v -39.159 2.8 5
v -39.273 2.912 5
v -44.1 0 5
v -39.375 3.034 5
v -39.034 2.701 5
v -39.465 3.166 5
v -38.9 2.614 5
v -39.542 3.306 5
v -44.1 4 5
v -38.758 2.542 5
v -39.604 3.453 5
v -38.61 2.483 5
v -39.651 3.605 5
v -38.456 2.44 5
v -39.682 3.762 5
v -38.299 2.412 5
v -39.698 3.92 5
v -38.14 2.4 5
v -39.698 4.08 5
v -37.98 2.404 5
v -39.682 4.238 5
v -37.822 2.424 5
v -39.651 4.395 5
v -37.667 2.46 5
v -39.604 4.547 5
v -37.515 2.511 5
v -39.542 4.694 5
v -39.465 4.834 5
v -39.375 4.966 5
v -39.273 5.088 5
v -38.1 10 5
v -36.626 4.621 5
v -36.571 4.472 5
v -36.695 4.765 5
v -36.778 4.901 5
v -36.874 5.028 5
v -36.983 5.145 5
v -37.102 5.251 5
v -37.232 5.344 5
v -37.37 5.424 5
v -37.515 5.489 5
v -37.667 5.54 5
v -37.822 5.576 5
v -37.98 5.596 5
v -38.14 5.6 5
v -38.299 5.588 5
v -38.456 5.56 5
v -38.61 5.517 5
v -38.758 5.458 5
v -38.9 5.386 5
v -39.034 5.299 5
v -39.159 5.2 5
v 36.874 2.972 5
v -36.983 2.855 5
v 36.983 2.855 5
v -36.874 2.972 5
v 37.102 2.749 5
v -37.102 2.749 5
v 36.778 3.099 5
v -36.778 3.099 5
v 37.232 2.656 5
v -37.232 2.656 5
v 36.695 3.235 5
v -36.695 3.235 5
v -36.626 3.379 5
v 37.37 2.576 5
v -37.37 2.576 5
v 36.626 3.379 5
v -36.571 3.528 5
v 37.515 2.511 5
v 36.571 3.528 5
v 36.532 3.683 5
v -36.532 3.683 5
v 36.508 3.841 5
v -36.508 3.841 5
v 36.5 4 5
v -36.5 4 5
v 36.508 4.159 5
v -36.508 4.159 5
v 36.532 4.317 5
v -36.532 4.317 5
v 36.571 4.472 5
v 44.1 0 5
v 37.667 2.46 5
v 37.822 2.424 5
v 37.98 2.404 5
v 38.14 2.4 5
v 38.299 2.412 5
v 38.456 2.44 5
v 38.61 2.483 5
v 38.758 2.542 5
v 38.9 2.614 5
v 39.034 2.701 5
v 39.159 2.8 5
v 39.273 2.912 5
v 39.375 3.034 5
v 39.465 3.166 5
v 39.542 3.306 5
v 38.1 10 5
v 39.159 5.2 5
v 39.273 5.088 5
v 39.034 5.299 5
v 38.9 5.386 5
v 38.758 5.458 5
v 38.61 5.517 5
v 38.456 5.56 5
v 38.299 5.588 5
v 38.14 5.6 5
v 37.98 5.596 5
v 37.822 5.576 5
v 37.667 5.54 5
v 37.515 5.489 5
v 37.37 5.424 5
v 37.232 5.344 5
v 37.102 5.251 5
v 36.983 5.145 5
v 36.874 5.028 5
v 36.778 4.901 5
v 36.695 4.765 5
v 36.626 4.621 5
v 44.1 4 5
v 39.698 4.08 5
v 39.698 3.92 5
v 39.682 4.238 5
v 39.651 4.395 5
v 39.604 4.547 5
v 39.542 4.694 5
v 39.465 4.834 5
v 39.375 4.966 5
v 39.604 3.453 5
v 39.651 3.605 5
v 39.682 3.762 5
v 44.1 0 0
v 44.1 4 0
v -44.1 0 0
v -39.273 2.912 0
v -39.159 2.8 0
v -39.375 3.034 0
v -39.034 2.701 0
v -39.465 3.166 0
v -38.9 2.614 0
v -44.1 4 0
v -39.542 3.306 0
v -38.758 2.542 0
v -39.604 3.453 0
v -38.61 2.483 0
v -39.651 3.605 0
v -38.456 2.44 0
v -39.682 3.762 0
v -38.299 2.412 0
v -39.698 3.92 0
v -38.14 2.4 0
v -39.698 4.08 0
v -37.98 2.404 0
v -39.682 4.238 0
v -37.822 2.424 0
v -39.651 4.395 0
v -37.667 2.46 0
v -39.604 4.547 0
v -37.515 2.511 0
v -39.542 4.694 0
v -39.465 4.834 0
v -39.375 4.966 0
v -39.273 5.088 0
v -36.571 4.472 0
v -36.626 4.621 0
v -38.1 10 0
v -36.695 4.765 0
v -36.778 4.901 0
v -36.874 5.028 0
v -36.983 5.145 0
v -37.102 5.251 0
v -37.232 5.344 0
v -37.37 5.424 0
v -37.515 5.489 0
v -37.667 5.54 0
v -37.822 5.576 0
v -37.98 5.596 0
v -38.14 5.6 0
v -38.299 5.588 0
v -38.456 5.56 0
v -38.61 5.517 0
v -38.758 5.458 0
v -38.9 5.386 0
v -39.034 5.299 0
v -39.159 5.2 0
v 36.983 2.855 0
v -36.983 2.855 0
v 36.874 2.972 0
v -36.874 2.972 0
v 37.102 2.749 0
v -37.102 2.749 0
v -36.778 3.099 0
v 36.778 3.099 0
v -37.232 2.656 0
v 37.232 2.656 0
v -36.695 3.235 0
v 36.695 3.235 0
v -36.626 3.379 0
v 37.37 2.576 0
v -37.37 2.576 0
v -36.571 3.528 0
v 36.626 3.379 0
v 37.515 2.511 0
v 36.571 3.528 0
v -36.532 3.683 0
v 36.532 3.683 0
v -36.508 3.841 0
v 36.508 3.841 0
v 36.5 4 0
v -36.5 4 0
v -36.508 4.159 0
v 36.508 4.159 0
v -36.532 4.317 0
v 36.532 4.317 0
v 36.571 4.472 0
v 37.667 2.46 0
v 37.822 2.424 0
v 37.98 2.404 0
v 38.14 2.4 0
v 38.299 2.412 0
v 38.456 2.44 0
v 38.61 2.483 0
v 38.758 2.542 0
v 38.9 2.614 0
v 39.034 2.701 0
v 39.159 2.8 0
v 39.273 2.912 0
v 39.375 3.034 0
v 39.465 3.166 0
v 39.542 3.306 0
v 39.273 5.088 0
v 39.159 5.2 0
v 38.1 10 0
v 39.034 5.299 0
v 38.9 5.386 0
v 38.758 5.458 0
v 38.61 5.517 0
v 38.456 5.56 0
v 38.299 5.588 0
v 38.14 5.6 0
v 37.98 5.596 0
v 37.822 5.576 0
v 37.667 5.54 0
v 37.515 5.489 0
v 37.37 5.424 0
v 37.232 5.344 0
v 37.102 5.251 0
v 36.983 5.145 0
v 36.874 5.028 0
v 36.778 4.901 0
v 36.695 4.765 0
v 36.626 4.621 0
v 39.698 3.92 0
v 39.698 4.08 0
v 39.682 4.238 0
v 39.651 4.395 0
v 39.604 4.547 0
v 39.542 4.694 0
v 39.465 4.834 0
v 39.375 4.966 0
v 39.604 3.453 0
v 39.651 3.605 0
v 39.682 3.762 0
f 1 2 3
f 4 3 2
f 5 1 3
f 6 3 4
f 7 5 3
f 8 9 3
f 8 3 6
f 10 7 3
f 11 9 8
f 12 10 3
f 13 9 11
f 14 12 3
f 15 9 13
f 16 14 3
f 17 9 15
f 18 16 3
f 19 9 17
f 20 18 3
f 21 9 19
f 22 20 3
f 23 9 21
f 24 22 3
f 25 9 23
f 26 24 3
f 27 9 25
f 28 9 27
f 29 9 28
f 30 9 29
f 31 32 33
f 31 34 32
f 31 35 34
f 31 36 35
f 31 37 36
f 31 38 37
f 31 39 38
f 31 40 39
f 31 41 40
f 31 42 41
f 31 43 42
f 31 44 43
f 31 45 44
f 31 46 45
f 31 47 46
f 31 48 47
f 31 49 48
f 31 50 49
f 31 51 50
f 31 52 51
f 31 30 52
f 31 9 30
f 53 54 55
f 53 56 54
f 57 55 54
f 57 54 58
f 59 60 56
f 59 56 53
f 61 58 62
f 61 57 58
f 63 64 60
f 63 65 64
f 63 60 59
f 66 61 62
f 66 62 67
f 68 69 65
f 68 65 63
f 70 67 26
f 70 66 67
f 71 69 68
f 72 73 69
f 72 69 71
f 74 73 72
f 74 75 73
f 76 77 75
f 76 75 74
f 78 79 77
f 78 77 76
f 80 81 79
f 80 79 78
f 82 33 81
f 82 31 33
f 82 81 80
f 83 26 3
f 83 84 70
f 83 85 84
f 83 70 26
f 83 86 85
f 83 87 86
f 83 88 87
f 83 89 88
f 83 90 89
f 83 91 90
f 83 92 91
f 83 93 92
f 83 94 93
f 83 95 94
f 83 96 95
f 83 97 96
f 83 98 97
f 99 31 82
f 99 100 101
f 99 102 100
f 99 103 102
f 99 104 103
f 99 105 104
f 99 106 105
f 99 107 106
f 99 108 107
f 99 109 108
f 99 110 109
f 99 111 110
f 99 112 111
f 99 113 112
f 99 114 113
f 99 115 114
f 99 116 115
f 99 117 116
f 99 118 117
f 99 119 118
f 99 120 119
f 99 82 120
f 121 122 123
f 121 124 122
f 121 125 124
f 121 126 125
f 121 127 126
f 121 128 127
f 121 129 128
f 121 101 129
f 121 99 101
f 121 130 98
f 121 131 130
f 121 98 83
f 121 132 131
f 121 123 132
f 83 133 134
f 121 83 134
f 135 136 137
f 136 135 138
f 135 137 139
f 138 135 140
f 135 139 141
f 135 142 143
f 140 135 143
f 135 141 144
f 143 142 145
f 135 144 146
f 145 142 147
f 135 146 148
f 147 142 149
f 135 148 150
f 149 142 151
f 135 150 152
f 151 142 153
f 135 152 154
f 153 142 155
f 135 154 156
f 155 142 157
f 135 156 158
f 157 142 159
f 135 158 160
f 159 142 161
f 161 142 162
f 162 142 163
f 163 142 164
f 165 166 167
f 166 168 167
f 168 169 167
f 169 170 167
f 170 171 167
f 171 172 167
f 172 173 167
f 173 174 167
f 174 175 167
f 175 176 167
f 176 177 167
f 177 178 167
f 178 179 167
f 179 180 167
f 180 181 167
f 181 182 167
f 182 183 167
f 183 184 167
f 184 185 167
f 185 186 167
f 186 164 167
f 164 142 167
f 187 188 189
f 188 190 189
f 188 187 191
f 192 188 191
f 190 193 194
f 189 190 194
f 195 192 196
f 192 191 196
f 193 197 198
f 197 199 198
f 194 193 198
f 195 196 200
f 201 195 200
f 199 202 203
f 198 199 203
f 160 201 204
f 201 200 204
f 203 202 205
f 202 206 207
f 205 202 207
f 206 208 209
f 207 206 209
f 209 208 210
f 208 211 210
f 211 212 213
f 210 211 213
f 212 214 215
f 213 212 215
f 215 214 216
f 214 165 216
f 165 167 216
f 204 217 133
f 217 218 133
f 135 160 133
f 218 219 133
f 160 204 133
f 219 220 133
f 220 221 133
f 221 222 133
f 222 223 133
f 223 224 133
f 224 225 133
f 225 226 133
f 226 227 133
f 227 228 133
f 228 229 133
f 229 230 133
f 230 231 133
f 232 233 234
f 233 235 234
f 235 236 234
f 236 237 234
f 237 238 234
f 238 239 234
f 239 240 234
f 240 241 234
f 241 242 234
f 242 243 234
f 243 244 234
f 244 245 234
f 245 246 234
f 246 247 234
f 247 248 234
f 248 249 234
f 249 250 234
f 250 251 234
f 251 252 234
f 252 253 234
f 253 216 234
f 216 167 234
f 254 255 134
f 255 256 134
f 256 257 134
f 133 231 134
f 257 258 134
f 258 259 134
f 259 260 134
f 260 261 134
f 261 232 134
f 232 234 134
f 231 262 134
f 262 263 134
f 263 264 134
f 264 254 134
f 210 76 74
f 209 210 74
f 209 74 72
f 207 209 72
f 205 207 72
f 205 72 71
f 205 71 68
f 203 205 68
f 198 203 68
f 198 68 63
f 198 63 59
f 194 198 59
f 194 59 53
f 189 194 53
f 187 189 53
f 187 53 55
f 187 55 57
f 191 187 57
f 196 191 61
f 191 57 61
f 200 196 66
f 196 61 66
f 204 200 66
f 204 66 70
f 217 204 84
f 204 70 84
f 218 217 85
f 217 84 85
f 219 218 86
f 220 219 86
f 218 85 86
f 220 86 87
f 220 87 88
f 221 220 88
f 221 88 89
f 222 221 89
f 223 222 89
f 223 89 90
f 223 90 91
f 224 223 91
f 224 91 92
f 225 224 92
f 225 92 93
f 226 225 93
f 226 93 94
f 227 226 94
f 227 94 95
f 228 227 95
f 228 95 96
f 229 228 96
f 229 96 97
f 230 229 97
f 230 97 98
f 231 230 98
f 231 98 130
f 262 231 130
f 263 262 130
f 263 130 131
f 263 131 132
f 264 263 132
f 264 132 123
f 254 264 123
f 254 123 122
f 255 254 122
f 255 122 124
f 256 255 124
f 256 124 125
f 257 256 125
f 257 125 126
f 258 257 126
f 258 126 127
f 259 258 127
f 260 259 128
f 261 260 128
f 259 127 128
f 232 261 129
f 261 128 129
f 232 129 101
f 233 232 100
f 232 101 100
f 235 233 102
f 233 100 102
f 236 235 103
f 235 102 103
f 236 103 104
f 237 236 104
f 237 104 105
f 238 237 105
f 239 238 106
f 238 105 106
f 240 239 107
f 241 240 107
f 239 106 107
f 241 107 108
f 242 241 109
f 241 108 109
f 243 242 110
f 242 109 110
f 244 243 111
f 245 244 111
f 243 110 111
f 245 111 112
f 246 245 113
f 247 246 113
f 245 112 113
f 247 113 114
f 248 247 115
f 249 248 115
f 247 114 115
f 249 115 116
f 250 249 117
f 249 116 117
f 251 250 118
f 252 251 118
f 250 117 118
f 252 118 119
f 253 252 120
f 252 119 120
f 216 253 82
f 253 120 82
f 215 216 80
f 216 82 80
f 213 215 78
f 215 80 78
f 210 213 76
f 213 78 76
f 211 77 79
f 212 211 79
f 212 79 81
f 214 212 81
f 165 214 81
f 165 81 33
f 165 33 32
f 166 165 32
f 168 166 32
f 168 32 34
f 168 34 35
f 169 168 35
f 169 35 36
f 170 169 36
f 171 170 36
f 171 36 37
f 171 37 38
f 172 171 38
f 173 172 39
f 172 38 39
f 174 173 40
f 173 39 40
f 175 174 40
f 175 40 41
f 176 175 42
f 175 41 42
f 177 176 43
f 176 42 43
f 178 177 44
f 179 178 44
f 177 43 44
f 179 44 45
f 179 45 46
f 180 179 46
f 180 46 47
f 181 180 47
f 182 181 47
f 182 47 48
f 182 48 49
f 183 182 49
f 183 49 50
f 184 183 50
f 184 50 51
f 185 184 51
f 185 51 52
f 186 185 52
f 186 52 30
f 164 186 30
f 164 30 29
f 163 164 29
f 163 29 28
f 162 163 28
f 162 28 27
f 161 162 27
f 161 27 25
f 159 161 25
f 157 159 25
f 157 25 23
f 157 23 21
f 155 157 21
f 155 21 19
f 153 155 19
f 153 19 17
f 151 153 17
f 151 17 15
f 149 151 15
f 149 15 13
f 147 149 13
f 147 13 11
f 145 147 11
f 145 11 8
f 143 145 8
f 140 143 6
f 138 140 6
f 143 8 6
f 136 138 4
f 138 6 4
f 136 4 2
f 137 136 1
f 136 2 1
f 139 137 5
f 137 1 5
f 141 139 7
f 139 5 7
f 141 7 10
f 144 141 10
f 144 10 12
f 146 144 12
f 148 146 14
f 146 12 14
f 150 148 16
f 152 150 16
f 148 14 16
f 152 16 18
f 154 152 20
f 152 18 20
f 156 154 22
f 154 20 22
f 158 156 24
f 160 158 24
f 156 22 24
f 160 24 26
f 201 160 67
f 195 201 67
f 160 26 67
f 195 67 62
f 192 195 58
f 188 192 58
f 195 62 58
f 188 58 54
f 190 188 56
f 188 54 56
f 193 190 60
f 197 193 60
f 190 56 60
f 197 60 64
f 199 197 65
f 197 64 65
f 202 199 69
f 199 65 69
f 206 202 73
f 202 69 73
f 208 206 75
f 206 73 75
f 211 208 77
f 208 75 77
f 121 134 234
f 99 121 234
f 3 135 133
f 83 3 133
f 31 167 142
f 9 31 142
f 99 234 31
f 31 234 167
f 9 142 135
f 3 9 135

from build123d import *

# Parameters (mm, degrees)
DODANIE_WYCI_GNI_CIE1_DEPTH = 5
SZKIC2_R                    = 1.6
WYTNIJ_WYCI_GNI_CIE1_DEPTH  = 46.495164578


with BuildPart() as part:
    # Szkic1 → Dodanie-wyciągnięcie1 (new body)
    with BuildSketch(Plane.XY):
        Polygon((-44.1, 0), (44.1, 0), (44.1, 4), (38.1, 10), (-38.1, 10), (-44.1, 4), align=None)
    extrude(amount=DODANIE_WYCI_GNI_CIE1_DEPTH)

    # Szkic2 → Wytnij-wyciągnięcie1 (cut, through all)
    with BuildSketch(Plane.XY.offset(5)):
        with Locations((-38.1, 4)):
            Circle(SZKIC2_R)
        with Locations(Location((38.1, 4, 0), (0, 0, 180))):
            Circle(SZKIC2_R)
    extrude(amount=-WYTNIJ_WYCI_GNI_CIE1_DEPTH, mode=Mode.SUBTRACT)


solid = part.part
